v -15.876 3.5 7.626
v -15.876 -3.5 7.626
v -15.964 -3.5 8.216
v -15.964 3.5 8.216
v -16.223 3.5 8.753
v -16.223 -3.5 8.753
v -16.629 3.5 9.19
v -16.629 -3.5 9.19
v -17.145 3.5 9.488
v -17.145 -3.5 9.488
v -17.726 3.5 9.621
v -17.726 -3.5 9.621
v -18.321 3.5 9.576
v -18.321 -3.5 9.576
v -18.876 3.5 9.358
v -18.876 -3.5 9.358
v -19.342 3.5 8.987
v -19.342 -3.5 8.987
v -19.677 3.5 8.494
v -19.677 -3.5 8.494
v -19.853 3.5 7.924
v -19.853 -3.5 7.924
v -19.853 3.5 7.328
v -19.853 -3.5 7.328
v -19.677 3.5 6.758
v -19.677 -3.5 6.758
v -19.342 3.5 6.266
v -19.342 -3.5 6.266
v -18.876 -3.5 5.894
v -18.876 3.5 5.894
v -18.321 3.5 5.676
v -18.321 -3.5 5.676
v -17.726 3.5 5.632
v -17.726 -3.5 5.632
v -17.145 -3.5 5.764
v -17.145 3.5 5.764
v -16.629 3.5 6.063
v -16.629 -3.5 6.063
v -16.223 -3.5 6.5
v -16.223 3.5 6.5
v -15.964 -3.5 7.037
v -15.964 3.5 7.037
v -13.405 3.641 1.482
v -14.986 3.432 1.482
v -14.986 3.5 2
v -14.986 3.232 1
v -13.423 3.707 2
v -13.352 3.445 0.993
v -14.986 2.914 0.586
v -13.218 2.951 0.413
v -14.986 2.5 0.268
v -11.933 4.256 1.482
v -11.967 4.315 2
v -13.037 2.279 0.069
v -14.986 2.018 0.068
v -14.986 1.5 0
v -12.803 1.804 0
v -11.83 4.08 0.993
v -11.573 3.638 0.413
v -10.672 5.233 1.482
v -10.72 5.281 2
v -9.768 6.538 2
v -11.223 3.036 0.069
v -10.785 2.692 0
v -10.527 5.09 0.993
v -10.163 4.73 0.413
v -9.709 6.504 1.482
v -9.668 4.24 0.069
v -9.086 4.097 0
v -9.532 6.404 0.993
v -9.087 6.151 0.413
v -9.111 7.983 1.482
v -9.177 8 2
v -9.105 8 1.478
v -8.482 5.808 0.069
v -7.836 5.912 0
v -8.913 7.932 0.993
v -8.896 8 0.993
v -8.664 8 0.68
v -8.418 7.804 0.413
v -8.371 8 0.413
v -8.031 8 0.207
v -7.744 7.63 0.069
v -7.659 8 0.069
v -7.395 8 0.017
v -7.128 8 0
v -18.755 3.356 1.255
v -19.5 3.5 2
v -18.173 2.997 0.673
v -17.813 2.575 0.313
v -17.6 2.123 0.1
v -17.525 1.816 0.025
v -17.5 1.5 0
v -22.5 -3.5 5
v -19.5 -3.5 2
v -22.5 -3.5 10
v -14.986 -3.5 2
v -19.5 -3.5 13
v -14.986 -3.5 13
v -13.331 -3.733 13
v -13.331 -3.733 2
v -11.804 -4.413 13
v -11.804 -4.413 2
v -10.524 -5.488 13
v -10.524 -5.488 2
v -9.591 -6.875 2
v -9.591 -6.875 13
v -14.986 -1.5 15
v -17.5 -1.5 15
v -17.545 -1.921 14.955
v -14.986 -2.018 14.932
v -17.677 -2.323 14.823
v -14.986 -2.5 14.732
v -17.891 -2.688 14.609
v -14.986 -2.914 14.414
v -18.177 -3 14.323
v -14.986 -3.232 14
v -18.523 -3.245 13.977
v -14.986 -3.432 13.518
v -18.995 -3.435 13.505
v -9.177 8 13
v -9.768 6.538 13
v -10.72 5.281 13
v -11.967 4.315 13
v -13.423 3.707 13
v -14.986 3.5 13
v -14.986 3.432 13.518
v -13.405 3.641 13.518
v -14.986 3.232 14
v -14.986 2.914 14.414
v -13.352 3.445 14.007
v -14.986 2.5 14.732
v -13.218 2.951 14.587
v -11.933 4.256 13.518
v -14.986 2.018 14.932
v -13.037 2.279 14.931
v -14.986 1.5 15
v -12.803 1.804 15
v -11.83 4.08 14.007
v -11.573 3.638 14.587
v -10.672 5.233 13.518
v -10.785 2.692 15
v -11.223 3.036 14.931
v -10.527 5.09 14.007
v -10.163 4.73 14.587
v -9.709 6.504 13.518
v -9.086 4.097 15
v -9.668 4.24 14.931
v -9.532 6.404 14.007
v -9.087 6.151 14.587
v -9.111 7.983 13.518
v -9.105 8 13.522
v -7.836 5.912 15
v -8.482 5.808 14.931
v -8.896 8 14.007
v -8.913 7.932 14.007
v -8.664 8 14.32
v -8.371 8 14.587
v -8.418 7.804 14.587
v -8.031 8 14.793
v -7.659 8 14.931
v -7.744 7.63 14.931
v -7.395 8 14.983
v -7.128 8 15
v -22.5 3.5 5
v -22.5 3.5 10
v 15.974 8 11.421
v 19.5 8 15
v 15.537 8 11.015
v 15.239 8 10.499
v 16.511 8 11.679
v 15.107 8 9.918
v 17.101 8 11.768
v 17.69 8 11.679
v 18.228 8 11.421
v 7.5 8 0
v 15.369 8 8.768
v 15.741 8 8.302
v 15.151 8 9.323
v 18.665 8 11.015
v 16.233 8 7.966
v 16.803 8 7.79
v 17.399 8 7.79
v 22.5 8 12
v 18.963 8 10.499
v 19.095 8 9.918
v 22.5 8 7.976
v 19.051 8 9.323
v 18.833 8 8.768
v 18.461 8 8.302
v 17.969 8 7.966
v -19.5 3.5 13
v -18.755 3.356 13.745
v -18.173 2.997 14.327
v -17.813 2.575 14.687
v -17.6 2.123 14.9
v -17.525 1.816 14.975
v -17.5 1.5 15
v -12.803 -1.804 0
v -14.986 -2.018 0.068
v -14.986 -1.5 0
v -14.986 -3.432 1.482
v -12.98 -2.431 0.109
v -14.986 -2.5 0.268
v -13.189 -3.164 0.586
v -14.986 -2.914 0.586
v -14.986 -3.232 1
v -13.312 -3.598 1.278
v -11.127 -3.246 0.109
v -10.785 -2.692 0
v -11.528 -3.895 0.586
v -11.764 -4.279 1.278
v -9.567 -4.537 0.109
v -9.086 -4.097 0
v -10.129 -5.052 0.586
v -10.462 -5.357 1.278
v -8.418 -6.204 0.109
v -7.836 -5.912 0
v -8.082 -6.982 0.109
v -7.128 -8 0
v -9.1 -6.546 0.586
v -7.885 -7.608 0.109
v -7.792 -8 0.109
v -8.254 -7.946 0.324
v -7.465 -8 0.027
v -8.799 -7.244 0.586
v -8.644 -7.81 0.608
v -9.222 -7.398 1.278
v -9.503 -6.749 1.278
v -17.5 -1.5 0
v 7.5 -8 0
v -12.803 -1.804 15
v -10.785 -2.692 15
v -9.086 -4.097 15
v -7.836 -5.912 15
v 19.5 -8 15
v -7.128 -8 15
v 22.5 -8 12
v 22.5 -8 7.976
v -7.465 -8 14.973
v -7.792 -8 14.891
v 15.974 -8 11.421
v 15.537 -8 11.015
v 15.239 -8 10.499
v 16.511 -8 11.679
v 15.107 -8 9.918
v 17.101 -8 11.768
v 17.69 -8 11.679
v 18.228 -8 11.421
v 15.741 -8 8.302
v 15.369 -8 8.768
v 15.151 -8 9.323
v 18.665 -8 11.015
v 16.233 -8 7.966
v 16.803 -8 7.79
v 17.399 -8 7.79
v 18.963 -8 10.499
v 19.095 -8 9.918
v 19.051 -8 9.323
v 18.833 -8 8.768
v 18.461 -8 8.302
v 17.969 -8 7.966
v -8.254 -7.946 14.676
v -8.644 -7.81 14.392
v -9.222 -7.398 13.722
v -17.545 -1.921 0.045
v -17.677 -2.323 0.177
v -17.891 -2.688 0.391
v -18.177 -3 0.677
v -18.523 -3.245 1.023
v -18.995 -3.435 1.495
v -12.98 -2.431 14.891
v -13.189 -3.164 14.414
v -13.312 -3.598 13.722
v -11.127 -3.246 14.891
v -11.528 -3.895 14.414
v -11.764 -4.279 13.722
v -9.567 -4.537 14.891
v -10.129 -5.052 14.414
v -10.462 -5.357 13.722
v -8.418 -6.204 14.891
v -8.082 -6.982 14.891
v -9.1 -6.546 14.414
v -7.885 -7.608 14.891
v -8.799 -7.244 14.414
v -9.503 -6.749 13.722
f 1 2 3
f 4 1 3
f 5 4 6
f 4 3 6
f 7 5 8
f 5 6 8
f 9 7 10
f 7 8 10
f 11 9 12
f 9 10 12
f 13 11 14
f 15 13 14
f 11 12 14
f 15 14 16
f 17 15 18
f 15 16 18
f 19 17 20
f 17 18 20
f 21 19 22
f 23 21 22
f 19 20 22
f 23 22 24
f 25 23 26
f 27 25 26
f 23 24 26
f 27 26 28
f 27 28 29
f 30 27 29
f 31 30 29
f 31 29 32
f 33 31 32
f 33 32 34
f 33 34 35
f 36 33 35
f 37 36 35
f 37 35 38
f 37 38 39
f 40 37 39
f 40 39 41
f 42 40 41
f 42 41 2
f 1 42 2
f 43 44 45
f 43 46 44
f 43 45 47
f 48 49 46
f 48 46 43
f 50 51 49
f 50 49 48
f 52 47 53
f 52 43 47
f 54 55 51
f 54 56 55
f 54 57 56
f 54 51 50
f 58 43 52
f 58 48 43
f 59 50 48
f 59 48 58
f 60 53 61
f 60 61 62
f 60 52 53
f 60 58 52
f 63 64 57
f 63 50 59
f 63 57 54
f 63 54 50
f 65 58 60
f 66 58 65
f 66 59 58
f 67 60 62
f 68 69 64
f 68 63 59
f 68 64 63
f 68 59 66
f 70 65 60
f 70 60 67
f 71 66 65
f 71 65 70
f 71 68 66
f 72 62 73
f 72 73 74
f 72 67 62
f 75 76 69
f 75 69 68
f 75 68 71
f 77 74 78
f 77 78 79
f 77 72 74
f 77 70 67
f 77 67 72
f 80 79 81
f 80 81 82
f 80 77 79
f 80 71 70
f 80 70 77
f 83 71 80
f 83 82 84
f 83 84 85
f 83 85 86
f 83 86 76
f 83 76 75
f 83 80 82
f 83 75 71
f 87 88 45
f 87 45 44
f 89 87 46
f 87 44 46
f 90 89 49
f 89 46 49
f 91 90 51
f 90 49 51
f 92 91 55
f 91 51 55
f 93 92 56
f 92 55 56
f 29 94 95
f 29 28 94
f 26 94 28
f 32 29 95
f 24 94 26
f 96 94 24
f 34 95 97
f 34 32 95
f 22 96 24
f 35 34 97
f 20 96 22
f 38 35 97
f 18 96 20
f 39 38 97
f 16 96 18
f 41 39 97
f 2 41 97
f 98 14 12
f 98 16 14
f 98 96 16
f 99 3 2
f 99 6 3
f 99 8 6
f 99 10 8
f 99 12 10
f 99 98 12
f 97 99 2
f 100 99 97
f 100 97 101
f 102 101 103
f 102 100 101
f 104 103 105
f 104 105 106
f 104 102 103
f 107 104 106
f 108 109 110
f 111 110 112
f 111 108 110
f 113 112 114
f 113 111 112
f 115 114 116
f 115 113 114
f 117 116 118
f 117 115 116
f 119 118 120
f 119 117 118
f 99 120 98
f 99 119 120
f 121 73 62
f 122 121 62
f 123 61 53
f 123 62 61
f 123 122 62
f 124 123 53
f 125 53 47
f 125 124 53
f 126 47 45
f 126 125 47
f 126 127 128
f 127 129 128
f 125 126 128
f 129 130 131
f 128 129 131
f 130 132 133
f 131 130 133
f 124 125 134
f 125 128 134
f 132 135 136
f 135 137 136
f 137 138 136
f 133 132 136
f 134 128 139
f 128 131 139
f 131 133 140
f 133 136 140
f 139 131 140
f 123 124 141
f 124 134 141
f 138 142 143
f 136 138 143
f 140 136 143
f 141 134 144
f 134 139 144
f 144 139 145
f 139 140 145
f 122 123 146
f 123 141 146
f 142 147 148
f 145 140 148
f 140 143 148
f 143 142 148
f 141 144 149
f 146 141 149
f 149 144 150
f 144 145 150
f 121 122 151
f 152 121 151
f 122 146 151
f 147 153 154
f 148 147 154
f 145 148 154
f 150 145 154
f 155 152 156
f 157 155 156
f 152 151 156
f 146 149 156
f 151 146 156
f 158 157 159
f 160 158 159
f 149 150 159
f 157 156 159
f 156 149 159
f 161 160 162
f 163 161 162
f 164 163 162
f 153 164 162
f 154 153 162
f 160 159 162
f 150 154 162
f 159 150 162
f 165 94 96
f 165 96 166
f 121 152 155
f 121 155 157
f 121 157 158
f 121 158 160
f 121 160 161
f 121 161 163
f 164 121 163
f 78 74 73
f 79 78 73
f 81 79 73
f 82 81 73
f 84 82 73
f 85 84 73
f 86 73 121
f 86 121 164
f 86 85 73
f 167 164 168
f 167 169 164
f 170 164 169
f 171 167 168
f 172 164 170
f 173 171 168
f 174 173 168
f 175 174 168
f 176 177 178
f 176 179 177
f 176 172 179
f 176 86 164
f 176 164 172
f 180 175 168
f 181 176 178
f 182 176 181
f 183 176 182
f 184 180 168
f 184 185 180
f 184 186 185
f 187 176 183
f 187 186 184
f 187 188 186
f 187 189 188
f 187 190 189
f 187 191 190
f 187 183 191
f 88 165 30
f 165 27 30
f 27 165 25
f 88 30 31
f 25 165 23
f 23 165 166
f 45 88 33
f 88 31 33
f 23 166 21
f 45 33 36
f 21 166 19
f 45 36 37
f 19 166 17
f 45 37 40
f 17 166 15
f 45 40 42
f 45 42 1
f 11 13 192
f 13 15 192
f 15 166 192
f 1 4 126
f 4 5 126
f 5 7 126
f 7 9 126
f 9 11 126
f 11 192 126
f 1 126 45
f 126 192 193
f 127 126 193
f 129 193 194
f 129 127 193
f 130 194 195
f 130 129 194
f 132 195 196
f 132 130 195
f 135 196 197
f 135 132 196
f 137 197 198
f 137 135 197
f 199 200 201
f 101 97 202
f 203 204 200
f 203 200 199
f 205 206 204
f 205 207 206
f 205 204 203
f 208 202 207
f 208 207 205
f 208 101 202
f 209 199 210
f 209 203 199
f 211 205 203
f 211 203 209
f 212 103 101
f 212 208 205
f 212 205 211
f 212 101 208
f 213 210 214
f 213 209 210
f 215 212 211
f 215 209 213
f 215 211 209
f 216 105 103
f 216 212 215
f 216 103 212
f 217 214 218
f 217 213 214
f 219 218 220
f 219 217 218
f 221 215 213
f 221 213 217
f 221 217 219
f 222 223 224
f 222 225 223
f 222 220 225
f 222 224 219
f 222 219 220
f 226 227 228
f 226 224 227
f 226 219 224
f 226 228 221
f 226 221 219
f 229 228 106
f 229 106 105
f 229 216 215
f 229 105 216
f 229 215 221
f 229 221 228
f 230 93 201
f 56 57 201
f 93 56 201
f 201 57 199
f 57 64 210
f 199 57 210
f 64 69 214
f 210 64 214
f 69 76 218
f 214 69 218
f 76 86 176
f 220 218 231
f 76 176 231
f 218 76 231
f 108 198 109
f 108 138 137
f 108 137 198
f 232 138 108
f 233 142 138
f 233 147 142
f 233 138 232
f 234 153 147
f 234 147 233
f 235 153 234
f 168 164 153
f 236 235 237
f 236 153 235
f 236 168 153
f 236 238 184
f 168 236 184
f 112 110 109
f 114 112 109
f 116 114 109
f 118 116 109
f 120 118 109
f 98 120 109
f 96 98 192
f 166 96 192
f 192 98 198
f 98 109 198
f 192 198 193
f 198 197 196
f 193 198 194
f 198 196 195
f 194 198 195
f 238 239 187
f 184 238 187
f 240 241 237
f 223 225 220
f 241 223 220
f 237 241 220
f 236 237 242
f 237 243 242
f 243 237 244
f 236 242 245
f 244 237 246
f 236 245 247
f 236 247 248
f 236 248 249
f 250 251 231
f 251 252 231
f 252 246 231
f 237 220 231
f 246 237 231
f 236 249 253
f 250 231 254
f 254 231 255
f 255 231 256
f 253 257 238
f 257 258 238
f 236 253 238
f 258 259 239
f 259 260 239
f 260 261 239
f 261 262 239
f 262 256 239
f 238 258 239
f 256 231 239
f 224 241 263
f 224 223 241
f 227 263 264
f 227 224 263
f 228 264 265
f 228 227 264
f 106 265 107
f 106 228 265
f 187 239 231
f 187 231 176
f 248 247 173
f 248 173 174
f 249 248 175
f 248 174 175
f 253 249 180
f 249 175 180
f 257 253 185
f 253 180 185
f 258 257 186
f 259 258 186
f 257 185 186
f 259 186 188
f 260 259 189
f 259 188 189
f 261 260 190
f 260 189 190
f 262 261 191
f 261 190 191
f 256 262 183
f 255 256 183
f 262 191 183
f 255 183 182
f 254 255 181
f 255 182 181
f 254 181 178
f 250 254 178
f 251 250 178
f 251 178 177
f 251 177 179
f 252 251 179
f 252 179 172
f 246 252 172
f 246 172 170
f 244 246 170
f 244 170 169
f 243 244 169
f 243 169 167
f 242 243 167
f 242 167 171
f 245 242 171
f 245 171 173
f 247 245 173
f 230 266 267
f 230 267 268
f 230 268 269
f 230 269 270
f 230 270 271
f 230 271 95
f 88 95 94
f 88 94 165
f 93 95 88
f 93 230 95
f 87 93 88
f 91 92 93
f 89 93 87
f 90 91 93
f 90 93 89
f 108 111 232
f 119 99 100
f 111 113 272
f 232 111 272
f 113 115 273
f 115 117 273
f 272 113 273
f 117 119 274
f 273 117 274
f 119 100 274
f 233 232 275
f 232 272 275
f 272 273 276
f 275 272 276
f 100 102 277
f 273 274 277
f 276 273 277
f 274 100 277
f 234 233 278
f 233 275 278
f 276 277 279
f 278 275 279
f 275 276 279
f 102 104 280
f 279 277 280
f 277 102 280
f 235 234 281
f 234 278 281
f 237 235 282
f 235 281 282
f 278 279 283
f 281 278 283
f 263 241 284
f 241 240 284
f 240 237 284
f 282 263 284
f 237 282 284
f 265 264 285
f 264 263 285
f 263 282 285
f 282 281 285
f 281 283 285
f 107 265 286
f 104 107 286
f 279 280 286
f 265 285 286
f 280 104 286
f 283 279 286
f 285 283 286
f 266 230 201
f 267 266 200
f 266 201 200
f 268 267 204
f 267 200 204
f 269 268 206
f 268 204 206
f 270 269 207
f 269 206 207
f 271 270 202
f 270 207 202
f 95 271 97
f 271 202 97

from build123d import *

# Parameters (mm, degrees)
SKETCH_1_W          = 45
SKETCH_1_H          = 16
EXTRUDE_1_DEPTH     = 15
SKETCH_2_W          = 16.428070739
SKETCH_2_H          = 9.700994635
CUT_EXTRUDE_2_DEPTH = 29.200177304
CHAMFER_2_SIZE      = 5
SKETCH_3_R          = 2
CUT_EXTRUDE_3_DEPTH = 30.38537051
SKETCH_4_R          = 2
CUT_EXTRUDE_1_DEPTH = 32.420534687
CHAMFER_13_SIZE     = 3
CHAMFER_14_SIZE     = 15
CHAMFER_14_SIZE2    = 7.975641475
FILLET_5_R          = 6
FILLET_6_R          = 2


with BuildPart() as part:
    # Эскиз1 → Вытянуть1 (new body)
    with BuildSketch(Plane.XY):
        Rectangle(SKETCH_1_W, SKETCH_1_H)
    extrude(amount=EXTRUDE_1_DEPTH)

    # Эскиз2 → Вытянуть2 (cut, through all)
    with BuildSketch(Plane.XY.offset(15)):
        with Locations((-17.390581002, -8.350497318)):
            Rectangle(SKETCH_2_W, SKETCH_2_H)
        with Locations((-17.390581002, 8.350497318)):
            Rectangle(SKETCH_2_W, SKETCH_2_H)
    extrude(amount=-CUT_EXTRUDE_2_DEPTH, mode=Mode.SUBTRACT)

    # Фаска2
    chamfer_2_edges = [part.edges().sort_by_distance(p)[0] for p in [
        (-22.5, 0, 0),
        (-22.5, 0, 15),
    ]]
    chamfer(chamfer_2_edges, length=CHAMFER_2_SIZE)

    # Эскиз3 → Вытянуть3 (cut, through all)
    with BuildSketch(Plane.XZ.offset(3.5)):
        with Locations((-17.875553024, 7.626170468)):
            Circle(SKETCH_3_R)
    extrude(amount=-CUT_EXTRUDE_3_DEPTH, mode=Mode.SUBTRACT)

    # Эскиз4 → Вырез-Вытянуть1 (cut, through all)
    with BuildSketch(Plane(origin=(0, 8, 0), x_dir=(1, 0, 0), z_dir=(0, 1, 0))):
        with Locations(Location((17.10092862, -9.768048927, 0), (0, 0, 270))):
            Circle(SKETCH_4_R)
    extrude(amount=-CUT_EXTRUDE_1_DEPTH, mode=Mode.SUBTRACT)

    # Фаска13
    chamfer_13_edges = [part.edges().sort_by_distance(p)[0] for p in [
        (22.5, 0, 15),
    ]]
    chamfer(chamfer_13_edges, length=CHAMFER_13_SIZE)

    # Фаска14
    chamfer_14_edges = [part.edges().sort_by_distance(p)[0] for p in [
        (22.5, 0, 0),
    ]]
    chamfer_14_side = [part.faces().sort_by_distance(p)[0] for p in [
        (4.599602818, 0, 0),
    ]]
    chamfer(chamfer_14_edges, length=CHAMFER_14_SIZE, length2=CHAMFER_14_SIZE2, reference=chamfer_14_side[0])

    # Скругление5
    # the kernel refuses this fillet: 6 mm, written as the material it adds along each edge
    with BuildSketch(Plane(origin=(-9.176545632, -3.5, 15), x_dir=(0, -1, 0), z_dir=(0, 0, -1))) as fillet_5_piece_1:
        with BuildLine():
            CenterArc((6, 5.809475019), FILLET_5_R, 180, 75.522487814)
            Line((0, 5.809475019), (-0.12, 5.809475019))
            Line((-0.12, 5.809475019), (-0.12, 0))
            Line((-0.12, 0), (0, -0.12))
            ThreePointArc((0, -0.12), (2.25, -0.12), (4.47, -0.1161895))
            Line((4.47, -0.1161895), (4.5, 0))
        make_face()
    extrude(amount=15)
    with BuildSketch(Plane(origin=(-9.176545632, 3.5, 15), x_dir=(0, 1, 0), z_dir=(0, 0, -1))) as fillet_5_piece_2:
        with BuildLine():
            CenterArc((6, -5.809475019), FILLET_5_R, 104.477512186, 75.522487814)
            Line((0, -5.809475019), (-0.12, -5.809475019))
            Line((-0.12, -5.809475019), (-0.12, 0))
            Line((-0.12, 0), (0, 0.12))
            ThreePointArc((0, 0.12), (2.25, 0.12), (4.47, 0.1161895))
            Line((4.47, 0.1161895), (4.5, 0))
        make_face()
    extrude(amount=15)

    # Скругление6
    fillet_6_edges = [part.edges().sort_by_distance(p)[0] for p in [
        (-9.176545632, -8, 7.5),
        (-16.243010326, 3.5, 0),
        (-16.243010326, 3.5, 15),
        (-16.243010326, -3.5, 0),
        (-16.243010326, -3.5, 15),
        (-11.311786037, -4.75658351, 15),
        (-11.311786037, -4.75658351, 0),
        (-11.311786037, 4.75658351, 15),
        (-11.311786037, 4.75658351, 0),
    ]]
    fillet(fillet_6_edges, radius=FILLET_6_R)


solid = part.part
